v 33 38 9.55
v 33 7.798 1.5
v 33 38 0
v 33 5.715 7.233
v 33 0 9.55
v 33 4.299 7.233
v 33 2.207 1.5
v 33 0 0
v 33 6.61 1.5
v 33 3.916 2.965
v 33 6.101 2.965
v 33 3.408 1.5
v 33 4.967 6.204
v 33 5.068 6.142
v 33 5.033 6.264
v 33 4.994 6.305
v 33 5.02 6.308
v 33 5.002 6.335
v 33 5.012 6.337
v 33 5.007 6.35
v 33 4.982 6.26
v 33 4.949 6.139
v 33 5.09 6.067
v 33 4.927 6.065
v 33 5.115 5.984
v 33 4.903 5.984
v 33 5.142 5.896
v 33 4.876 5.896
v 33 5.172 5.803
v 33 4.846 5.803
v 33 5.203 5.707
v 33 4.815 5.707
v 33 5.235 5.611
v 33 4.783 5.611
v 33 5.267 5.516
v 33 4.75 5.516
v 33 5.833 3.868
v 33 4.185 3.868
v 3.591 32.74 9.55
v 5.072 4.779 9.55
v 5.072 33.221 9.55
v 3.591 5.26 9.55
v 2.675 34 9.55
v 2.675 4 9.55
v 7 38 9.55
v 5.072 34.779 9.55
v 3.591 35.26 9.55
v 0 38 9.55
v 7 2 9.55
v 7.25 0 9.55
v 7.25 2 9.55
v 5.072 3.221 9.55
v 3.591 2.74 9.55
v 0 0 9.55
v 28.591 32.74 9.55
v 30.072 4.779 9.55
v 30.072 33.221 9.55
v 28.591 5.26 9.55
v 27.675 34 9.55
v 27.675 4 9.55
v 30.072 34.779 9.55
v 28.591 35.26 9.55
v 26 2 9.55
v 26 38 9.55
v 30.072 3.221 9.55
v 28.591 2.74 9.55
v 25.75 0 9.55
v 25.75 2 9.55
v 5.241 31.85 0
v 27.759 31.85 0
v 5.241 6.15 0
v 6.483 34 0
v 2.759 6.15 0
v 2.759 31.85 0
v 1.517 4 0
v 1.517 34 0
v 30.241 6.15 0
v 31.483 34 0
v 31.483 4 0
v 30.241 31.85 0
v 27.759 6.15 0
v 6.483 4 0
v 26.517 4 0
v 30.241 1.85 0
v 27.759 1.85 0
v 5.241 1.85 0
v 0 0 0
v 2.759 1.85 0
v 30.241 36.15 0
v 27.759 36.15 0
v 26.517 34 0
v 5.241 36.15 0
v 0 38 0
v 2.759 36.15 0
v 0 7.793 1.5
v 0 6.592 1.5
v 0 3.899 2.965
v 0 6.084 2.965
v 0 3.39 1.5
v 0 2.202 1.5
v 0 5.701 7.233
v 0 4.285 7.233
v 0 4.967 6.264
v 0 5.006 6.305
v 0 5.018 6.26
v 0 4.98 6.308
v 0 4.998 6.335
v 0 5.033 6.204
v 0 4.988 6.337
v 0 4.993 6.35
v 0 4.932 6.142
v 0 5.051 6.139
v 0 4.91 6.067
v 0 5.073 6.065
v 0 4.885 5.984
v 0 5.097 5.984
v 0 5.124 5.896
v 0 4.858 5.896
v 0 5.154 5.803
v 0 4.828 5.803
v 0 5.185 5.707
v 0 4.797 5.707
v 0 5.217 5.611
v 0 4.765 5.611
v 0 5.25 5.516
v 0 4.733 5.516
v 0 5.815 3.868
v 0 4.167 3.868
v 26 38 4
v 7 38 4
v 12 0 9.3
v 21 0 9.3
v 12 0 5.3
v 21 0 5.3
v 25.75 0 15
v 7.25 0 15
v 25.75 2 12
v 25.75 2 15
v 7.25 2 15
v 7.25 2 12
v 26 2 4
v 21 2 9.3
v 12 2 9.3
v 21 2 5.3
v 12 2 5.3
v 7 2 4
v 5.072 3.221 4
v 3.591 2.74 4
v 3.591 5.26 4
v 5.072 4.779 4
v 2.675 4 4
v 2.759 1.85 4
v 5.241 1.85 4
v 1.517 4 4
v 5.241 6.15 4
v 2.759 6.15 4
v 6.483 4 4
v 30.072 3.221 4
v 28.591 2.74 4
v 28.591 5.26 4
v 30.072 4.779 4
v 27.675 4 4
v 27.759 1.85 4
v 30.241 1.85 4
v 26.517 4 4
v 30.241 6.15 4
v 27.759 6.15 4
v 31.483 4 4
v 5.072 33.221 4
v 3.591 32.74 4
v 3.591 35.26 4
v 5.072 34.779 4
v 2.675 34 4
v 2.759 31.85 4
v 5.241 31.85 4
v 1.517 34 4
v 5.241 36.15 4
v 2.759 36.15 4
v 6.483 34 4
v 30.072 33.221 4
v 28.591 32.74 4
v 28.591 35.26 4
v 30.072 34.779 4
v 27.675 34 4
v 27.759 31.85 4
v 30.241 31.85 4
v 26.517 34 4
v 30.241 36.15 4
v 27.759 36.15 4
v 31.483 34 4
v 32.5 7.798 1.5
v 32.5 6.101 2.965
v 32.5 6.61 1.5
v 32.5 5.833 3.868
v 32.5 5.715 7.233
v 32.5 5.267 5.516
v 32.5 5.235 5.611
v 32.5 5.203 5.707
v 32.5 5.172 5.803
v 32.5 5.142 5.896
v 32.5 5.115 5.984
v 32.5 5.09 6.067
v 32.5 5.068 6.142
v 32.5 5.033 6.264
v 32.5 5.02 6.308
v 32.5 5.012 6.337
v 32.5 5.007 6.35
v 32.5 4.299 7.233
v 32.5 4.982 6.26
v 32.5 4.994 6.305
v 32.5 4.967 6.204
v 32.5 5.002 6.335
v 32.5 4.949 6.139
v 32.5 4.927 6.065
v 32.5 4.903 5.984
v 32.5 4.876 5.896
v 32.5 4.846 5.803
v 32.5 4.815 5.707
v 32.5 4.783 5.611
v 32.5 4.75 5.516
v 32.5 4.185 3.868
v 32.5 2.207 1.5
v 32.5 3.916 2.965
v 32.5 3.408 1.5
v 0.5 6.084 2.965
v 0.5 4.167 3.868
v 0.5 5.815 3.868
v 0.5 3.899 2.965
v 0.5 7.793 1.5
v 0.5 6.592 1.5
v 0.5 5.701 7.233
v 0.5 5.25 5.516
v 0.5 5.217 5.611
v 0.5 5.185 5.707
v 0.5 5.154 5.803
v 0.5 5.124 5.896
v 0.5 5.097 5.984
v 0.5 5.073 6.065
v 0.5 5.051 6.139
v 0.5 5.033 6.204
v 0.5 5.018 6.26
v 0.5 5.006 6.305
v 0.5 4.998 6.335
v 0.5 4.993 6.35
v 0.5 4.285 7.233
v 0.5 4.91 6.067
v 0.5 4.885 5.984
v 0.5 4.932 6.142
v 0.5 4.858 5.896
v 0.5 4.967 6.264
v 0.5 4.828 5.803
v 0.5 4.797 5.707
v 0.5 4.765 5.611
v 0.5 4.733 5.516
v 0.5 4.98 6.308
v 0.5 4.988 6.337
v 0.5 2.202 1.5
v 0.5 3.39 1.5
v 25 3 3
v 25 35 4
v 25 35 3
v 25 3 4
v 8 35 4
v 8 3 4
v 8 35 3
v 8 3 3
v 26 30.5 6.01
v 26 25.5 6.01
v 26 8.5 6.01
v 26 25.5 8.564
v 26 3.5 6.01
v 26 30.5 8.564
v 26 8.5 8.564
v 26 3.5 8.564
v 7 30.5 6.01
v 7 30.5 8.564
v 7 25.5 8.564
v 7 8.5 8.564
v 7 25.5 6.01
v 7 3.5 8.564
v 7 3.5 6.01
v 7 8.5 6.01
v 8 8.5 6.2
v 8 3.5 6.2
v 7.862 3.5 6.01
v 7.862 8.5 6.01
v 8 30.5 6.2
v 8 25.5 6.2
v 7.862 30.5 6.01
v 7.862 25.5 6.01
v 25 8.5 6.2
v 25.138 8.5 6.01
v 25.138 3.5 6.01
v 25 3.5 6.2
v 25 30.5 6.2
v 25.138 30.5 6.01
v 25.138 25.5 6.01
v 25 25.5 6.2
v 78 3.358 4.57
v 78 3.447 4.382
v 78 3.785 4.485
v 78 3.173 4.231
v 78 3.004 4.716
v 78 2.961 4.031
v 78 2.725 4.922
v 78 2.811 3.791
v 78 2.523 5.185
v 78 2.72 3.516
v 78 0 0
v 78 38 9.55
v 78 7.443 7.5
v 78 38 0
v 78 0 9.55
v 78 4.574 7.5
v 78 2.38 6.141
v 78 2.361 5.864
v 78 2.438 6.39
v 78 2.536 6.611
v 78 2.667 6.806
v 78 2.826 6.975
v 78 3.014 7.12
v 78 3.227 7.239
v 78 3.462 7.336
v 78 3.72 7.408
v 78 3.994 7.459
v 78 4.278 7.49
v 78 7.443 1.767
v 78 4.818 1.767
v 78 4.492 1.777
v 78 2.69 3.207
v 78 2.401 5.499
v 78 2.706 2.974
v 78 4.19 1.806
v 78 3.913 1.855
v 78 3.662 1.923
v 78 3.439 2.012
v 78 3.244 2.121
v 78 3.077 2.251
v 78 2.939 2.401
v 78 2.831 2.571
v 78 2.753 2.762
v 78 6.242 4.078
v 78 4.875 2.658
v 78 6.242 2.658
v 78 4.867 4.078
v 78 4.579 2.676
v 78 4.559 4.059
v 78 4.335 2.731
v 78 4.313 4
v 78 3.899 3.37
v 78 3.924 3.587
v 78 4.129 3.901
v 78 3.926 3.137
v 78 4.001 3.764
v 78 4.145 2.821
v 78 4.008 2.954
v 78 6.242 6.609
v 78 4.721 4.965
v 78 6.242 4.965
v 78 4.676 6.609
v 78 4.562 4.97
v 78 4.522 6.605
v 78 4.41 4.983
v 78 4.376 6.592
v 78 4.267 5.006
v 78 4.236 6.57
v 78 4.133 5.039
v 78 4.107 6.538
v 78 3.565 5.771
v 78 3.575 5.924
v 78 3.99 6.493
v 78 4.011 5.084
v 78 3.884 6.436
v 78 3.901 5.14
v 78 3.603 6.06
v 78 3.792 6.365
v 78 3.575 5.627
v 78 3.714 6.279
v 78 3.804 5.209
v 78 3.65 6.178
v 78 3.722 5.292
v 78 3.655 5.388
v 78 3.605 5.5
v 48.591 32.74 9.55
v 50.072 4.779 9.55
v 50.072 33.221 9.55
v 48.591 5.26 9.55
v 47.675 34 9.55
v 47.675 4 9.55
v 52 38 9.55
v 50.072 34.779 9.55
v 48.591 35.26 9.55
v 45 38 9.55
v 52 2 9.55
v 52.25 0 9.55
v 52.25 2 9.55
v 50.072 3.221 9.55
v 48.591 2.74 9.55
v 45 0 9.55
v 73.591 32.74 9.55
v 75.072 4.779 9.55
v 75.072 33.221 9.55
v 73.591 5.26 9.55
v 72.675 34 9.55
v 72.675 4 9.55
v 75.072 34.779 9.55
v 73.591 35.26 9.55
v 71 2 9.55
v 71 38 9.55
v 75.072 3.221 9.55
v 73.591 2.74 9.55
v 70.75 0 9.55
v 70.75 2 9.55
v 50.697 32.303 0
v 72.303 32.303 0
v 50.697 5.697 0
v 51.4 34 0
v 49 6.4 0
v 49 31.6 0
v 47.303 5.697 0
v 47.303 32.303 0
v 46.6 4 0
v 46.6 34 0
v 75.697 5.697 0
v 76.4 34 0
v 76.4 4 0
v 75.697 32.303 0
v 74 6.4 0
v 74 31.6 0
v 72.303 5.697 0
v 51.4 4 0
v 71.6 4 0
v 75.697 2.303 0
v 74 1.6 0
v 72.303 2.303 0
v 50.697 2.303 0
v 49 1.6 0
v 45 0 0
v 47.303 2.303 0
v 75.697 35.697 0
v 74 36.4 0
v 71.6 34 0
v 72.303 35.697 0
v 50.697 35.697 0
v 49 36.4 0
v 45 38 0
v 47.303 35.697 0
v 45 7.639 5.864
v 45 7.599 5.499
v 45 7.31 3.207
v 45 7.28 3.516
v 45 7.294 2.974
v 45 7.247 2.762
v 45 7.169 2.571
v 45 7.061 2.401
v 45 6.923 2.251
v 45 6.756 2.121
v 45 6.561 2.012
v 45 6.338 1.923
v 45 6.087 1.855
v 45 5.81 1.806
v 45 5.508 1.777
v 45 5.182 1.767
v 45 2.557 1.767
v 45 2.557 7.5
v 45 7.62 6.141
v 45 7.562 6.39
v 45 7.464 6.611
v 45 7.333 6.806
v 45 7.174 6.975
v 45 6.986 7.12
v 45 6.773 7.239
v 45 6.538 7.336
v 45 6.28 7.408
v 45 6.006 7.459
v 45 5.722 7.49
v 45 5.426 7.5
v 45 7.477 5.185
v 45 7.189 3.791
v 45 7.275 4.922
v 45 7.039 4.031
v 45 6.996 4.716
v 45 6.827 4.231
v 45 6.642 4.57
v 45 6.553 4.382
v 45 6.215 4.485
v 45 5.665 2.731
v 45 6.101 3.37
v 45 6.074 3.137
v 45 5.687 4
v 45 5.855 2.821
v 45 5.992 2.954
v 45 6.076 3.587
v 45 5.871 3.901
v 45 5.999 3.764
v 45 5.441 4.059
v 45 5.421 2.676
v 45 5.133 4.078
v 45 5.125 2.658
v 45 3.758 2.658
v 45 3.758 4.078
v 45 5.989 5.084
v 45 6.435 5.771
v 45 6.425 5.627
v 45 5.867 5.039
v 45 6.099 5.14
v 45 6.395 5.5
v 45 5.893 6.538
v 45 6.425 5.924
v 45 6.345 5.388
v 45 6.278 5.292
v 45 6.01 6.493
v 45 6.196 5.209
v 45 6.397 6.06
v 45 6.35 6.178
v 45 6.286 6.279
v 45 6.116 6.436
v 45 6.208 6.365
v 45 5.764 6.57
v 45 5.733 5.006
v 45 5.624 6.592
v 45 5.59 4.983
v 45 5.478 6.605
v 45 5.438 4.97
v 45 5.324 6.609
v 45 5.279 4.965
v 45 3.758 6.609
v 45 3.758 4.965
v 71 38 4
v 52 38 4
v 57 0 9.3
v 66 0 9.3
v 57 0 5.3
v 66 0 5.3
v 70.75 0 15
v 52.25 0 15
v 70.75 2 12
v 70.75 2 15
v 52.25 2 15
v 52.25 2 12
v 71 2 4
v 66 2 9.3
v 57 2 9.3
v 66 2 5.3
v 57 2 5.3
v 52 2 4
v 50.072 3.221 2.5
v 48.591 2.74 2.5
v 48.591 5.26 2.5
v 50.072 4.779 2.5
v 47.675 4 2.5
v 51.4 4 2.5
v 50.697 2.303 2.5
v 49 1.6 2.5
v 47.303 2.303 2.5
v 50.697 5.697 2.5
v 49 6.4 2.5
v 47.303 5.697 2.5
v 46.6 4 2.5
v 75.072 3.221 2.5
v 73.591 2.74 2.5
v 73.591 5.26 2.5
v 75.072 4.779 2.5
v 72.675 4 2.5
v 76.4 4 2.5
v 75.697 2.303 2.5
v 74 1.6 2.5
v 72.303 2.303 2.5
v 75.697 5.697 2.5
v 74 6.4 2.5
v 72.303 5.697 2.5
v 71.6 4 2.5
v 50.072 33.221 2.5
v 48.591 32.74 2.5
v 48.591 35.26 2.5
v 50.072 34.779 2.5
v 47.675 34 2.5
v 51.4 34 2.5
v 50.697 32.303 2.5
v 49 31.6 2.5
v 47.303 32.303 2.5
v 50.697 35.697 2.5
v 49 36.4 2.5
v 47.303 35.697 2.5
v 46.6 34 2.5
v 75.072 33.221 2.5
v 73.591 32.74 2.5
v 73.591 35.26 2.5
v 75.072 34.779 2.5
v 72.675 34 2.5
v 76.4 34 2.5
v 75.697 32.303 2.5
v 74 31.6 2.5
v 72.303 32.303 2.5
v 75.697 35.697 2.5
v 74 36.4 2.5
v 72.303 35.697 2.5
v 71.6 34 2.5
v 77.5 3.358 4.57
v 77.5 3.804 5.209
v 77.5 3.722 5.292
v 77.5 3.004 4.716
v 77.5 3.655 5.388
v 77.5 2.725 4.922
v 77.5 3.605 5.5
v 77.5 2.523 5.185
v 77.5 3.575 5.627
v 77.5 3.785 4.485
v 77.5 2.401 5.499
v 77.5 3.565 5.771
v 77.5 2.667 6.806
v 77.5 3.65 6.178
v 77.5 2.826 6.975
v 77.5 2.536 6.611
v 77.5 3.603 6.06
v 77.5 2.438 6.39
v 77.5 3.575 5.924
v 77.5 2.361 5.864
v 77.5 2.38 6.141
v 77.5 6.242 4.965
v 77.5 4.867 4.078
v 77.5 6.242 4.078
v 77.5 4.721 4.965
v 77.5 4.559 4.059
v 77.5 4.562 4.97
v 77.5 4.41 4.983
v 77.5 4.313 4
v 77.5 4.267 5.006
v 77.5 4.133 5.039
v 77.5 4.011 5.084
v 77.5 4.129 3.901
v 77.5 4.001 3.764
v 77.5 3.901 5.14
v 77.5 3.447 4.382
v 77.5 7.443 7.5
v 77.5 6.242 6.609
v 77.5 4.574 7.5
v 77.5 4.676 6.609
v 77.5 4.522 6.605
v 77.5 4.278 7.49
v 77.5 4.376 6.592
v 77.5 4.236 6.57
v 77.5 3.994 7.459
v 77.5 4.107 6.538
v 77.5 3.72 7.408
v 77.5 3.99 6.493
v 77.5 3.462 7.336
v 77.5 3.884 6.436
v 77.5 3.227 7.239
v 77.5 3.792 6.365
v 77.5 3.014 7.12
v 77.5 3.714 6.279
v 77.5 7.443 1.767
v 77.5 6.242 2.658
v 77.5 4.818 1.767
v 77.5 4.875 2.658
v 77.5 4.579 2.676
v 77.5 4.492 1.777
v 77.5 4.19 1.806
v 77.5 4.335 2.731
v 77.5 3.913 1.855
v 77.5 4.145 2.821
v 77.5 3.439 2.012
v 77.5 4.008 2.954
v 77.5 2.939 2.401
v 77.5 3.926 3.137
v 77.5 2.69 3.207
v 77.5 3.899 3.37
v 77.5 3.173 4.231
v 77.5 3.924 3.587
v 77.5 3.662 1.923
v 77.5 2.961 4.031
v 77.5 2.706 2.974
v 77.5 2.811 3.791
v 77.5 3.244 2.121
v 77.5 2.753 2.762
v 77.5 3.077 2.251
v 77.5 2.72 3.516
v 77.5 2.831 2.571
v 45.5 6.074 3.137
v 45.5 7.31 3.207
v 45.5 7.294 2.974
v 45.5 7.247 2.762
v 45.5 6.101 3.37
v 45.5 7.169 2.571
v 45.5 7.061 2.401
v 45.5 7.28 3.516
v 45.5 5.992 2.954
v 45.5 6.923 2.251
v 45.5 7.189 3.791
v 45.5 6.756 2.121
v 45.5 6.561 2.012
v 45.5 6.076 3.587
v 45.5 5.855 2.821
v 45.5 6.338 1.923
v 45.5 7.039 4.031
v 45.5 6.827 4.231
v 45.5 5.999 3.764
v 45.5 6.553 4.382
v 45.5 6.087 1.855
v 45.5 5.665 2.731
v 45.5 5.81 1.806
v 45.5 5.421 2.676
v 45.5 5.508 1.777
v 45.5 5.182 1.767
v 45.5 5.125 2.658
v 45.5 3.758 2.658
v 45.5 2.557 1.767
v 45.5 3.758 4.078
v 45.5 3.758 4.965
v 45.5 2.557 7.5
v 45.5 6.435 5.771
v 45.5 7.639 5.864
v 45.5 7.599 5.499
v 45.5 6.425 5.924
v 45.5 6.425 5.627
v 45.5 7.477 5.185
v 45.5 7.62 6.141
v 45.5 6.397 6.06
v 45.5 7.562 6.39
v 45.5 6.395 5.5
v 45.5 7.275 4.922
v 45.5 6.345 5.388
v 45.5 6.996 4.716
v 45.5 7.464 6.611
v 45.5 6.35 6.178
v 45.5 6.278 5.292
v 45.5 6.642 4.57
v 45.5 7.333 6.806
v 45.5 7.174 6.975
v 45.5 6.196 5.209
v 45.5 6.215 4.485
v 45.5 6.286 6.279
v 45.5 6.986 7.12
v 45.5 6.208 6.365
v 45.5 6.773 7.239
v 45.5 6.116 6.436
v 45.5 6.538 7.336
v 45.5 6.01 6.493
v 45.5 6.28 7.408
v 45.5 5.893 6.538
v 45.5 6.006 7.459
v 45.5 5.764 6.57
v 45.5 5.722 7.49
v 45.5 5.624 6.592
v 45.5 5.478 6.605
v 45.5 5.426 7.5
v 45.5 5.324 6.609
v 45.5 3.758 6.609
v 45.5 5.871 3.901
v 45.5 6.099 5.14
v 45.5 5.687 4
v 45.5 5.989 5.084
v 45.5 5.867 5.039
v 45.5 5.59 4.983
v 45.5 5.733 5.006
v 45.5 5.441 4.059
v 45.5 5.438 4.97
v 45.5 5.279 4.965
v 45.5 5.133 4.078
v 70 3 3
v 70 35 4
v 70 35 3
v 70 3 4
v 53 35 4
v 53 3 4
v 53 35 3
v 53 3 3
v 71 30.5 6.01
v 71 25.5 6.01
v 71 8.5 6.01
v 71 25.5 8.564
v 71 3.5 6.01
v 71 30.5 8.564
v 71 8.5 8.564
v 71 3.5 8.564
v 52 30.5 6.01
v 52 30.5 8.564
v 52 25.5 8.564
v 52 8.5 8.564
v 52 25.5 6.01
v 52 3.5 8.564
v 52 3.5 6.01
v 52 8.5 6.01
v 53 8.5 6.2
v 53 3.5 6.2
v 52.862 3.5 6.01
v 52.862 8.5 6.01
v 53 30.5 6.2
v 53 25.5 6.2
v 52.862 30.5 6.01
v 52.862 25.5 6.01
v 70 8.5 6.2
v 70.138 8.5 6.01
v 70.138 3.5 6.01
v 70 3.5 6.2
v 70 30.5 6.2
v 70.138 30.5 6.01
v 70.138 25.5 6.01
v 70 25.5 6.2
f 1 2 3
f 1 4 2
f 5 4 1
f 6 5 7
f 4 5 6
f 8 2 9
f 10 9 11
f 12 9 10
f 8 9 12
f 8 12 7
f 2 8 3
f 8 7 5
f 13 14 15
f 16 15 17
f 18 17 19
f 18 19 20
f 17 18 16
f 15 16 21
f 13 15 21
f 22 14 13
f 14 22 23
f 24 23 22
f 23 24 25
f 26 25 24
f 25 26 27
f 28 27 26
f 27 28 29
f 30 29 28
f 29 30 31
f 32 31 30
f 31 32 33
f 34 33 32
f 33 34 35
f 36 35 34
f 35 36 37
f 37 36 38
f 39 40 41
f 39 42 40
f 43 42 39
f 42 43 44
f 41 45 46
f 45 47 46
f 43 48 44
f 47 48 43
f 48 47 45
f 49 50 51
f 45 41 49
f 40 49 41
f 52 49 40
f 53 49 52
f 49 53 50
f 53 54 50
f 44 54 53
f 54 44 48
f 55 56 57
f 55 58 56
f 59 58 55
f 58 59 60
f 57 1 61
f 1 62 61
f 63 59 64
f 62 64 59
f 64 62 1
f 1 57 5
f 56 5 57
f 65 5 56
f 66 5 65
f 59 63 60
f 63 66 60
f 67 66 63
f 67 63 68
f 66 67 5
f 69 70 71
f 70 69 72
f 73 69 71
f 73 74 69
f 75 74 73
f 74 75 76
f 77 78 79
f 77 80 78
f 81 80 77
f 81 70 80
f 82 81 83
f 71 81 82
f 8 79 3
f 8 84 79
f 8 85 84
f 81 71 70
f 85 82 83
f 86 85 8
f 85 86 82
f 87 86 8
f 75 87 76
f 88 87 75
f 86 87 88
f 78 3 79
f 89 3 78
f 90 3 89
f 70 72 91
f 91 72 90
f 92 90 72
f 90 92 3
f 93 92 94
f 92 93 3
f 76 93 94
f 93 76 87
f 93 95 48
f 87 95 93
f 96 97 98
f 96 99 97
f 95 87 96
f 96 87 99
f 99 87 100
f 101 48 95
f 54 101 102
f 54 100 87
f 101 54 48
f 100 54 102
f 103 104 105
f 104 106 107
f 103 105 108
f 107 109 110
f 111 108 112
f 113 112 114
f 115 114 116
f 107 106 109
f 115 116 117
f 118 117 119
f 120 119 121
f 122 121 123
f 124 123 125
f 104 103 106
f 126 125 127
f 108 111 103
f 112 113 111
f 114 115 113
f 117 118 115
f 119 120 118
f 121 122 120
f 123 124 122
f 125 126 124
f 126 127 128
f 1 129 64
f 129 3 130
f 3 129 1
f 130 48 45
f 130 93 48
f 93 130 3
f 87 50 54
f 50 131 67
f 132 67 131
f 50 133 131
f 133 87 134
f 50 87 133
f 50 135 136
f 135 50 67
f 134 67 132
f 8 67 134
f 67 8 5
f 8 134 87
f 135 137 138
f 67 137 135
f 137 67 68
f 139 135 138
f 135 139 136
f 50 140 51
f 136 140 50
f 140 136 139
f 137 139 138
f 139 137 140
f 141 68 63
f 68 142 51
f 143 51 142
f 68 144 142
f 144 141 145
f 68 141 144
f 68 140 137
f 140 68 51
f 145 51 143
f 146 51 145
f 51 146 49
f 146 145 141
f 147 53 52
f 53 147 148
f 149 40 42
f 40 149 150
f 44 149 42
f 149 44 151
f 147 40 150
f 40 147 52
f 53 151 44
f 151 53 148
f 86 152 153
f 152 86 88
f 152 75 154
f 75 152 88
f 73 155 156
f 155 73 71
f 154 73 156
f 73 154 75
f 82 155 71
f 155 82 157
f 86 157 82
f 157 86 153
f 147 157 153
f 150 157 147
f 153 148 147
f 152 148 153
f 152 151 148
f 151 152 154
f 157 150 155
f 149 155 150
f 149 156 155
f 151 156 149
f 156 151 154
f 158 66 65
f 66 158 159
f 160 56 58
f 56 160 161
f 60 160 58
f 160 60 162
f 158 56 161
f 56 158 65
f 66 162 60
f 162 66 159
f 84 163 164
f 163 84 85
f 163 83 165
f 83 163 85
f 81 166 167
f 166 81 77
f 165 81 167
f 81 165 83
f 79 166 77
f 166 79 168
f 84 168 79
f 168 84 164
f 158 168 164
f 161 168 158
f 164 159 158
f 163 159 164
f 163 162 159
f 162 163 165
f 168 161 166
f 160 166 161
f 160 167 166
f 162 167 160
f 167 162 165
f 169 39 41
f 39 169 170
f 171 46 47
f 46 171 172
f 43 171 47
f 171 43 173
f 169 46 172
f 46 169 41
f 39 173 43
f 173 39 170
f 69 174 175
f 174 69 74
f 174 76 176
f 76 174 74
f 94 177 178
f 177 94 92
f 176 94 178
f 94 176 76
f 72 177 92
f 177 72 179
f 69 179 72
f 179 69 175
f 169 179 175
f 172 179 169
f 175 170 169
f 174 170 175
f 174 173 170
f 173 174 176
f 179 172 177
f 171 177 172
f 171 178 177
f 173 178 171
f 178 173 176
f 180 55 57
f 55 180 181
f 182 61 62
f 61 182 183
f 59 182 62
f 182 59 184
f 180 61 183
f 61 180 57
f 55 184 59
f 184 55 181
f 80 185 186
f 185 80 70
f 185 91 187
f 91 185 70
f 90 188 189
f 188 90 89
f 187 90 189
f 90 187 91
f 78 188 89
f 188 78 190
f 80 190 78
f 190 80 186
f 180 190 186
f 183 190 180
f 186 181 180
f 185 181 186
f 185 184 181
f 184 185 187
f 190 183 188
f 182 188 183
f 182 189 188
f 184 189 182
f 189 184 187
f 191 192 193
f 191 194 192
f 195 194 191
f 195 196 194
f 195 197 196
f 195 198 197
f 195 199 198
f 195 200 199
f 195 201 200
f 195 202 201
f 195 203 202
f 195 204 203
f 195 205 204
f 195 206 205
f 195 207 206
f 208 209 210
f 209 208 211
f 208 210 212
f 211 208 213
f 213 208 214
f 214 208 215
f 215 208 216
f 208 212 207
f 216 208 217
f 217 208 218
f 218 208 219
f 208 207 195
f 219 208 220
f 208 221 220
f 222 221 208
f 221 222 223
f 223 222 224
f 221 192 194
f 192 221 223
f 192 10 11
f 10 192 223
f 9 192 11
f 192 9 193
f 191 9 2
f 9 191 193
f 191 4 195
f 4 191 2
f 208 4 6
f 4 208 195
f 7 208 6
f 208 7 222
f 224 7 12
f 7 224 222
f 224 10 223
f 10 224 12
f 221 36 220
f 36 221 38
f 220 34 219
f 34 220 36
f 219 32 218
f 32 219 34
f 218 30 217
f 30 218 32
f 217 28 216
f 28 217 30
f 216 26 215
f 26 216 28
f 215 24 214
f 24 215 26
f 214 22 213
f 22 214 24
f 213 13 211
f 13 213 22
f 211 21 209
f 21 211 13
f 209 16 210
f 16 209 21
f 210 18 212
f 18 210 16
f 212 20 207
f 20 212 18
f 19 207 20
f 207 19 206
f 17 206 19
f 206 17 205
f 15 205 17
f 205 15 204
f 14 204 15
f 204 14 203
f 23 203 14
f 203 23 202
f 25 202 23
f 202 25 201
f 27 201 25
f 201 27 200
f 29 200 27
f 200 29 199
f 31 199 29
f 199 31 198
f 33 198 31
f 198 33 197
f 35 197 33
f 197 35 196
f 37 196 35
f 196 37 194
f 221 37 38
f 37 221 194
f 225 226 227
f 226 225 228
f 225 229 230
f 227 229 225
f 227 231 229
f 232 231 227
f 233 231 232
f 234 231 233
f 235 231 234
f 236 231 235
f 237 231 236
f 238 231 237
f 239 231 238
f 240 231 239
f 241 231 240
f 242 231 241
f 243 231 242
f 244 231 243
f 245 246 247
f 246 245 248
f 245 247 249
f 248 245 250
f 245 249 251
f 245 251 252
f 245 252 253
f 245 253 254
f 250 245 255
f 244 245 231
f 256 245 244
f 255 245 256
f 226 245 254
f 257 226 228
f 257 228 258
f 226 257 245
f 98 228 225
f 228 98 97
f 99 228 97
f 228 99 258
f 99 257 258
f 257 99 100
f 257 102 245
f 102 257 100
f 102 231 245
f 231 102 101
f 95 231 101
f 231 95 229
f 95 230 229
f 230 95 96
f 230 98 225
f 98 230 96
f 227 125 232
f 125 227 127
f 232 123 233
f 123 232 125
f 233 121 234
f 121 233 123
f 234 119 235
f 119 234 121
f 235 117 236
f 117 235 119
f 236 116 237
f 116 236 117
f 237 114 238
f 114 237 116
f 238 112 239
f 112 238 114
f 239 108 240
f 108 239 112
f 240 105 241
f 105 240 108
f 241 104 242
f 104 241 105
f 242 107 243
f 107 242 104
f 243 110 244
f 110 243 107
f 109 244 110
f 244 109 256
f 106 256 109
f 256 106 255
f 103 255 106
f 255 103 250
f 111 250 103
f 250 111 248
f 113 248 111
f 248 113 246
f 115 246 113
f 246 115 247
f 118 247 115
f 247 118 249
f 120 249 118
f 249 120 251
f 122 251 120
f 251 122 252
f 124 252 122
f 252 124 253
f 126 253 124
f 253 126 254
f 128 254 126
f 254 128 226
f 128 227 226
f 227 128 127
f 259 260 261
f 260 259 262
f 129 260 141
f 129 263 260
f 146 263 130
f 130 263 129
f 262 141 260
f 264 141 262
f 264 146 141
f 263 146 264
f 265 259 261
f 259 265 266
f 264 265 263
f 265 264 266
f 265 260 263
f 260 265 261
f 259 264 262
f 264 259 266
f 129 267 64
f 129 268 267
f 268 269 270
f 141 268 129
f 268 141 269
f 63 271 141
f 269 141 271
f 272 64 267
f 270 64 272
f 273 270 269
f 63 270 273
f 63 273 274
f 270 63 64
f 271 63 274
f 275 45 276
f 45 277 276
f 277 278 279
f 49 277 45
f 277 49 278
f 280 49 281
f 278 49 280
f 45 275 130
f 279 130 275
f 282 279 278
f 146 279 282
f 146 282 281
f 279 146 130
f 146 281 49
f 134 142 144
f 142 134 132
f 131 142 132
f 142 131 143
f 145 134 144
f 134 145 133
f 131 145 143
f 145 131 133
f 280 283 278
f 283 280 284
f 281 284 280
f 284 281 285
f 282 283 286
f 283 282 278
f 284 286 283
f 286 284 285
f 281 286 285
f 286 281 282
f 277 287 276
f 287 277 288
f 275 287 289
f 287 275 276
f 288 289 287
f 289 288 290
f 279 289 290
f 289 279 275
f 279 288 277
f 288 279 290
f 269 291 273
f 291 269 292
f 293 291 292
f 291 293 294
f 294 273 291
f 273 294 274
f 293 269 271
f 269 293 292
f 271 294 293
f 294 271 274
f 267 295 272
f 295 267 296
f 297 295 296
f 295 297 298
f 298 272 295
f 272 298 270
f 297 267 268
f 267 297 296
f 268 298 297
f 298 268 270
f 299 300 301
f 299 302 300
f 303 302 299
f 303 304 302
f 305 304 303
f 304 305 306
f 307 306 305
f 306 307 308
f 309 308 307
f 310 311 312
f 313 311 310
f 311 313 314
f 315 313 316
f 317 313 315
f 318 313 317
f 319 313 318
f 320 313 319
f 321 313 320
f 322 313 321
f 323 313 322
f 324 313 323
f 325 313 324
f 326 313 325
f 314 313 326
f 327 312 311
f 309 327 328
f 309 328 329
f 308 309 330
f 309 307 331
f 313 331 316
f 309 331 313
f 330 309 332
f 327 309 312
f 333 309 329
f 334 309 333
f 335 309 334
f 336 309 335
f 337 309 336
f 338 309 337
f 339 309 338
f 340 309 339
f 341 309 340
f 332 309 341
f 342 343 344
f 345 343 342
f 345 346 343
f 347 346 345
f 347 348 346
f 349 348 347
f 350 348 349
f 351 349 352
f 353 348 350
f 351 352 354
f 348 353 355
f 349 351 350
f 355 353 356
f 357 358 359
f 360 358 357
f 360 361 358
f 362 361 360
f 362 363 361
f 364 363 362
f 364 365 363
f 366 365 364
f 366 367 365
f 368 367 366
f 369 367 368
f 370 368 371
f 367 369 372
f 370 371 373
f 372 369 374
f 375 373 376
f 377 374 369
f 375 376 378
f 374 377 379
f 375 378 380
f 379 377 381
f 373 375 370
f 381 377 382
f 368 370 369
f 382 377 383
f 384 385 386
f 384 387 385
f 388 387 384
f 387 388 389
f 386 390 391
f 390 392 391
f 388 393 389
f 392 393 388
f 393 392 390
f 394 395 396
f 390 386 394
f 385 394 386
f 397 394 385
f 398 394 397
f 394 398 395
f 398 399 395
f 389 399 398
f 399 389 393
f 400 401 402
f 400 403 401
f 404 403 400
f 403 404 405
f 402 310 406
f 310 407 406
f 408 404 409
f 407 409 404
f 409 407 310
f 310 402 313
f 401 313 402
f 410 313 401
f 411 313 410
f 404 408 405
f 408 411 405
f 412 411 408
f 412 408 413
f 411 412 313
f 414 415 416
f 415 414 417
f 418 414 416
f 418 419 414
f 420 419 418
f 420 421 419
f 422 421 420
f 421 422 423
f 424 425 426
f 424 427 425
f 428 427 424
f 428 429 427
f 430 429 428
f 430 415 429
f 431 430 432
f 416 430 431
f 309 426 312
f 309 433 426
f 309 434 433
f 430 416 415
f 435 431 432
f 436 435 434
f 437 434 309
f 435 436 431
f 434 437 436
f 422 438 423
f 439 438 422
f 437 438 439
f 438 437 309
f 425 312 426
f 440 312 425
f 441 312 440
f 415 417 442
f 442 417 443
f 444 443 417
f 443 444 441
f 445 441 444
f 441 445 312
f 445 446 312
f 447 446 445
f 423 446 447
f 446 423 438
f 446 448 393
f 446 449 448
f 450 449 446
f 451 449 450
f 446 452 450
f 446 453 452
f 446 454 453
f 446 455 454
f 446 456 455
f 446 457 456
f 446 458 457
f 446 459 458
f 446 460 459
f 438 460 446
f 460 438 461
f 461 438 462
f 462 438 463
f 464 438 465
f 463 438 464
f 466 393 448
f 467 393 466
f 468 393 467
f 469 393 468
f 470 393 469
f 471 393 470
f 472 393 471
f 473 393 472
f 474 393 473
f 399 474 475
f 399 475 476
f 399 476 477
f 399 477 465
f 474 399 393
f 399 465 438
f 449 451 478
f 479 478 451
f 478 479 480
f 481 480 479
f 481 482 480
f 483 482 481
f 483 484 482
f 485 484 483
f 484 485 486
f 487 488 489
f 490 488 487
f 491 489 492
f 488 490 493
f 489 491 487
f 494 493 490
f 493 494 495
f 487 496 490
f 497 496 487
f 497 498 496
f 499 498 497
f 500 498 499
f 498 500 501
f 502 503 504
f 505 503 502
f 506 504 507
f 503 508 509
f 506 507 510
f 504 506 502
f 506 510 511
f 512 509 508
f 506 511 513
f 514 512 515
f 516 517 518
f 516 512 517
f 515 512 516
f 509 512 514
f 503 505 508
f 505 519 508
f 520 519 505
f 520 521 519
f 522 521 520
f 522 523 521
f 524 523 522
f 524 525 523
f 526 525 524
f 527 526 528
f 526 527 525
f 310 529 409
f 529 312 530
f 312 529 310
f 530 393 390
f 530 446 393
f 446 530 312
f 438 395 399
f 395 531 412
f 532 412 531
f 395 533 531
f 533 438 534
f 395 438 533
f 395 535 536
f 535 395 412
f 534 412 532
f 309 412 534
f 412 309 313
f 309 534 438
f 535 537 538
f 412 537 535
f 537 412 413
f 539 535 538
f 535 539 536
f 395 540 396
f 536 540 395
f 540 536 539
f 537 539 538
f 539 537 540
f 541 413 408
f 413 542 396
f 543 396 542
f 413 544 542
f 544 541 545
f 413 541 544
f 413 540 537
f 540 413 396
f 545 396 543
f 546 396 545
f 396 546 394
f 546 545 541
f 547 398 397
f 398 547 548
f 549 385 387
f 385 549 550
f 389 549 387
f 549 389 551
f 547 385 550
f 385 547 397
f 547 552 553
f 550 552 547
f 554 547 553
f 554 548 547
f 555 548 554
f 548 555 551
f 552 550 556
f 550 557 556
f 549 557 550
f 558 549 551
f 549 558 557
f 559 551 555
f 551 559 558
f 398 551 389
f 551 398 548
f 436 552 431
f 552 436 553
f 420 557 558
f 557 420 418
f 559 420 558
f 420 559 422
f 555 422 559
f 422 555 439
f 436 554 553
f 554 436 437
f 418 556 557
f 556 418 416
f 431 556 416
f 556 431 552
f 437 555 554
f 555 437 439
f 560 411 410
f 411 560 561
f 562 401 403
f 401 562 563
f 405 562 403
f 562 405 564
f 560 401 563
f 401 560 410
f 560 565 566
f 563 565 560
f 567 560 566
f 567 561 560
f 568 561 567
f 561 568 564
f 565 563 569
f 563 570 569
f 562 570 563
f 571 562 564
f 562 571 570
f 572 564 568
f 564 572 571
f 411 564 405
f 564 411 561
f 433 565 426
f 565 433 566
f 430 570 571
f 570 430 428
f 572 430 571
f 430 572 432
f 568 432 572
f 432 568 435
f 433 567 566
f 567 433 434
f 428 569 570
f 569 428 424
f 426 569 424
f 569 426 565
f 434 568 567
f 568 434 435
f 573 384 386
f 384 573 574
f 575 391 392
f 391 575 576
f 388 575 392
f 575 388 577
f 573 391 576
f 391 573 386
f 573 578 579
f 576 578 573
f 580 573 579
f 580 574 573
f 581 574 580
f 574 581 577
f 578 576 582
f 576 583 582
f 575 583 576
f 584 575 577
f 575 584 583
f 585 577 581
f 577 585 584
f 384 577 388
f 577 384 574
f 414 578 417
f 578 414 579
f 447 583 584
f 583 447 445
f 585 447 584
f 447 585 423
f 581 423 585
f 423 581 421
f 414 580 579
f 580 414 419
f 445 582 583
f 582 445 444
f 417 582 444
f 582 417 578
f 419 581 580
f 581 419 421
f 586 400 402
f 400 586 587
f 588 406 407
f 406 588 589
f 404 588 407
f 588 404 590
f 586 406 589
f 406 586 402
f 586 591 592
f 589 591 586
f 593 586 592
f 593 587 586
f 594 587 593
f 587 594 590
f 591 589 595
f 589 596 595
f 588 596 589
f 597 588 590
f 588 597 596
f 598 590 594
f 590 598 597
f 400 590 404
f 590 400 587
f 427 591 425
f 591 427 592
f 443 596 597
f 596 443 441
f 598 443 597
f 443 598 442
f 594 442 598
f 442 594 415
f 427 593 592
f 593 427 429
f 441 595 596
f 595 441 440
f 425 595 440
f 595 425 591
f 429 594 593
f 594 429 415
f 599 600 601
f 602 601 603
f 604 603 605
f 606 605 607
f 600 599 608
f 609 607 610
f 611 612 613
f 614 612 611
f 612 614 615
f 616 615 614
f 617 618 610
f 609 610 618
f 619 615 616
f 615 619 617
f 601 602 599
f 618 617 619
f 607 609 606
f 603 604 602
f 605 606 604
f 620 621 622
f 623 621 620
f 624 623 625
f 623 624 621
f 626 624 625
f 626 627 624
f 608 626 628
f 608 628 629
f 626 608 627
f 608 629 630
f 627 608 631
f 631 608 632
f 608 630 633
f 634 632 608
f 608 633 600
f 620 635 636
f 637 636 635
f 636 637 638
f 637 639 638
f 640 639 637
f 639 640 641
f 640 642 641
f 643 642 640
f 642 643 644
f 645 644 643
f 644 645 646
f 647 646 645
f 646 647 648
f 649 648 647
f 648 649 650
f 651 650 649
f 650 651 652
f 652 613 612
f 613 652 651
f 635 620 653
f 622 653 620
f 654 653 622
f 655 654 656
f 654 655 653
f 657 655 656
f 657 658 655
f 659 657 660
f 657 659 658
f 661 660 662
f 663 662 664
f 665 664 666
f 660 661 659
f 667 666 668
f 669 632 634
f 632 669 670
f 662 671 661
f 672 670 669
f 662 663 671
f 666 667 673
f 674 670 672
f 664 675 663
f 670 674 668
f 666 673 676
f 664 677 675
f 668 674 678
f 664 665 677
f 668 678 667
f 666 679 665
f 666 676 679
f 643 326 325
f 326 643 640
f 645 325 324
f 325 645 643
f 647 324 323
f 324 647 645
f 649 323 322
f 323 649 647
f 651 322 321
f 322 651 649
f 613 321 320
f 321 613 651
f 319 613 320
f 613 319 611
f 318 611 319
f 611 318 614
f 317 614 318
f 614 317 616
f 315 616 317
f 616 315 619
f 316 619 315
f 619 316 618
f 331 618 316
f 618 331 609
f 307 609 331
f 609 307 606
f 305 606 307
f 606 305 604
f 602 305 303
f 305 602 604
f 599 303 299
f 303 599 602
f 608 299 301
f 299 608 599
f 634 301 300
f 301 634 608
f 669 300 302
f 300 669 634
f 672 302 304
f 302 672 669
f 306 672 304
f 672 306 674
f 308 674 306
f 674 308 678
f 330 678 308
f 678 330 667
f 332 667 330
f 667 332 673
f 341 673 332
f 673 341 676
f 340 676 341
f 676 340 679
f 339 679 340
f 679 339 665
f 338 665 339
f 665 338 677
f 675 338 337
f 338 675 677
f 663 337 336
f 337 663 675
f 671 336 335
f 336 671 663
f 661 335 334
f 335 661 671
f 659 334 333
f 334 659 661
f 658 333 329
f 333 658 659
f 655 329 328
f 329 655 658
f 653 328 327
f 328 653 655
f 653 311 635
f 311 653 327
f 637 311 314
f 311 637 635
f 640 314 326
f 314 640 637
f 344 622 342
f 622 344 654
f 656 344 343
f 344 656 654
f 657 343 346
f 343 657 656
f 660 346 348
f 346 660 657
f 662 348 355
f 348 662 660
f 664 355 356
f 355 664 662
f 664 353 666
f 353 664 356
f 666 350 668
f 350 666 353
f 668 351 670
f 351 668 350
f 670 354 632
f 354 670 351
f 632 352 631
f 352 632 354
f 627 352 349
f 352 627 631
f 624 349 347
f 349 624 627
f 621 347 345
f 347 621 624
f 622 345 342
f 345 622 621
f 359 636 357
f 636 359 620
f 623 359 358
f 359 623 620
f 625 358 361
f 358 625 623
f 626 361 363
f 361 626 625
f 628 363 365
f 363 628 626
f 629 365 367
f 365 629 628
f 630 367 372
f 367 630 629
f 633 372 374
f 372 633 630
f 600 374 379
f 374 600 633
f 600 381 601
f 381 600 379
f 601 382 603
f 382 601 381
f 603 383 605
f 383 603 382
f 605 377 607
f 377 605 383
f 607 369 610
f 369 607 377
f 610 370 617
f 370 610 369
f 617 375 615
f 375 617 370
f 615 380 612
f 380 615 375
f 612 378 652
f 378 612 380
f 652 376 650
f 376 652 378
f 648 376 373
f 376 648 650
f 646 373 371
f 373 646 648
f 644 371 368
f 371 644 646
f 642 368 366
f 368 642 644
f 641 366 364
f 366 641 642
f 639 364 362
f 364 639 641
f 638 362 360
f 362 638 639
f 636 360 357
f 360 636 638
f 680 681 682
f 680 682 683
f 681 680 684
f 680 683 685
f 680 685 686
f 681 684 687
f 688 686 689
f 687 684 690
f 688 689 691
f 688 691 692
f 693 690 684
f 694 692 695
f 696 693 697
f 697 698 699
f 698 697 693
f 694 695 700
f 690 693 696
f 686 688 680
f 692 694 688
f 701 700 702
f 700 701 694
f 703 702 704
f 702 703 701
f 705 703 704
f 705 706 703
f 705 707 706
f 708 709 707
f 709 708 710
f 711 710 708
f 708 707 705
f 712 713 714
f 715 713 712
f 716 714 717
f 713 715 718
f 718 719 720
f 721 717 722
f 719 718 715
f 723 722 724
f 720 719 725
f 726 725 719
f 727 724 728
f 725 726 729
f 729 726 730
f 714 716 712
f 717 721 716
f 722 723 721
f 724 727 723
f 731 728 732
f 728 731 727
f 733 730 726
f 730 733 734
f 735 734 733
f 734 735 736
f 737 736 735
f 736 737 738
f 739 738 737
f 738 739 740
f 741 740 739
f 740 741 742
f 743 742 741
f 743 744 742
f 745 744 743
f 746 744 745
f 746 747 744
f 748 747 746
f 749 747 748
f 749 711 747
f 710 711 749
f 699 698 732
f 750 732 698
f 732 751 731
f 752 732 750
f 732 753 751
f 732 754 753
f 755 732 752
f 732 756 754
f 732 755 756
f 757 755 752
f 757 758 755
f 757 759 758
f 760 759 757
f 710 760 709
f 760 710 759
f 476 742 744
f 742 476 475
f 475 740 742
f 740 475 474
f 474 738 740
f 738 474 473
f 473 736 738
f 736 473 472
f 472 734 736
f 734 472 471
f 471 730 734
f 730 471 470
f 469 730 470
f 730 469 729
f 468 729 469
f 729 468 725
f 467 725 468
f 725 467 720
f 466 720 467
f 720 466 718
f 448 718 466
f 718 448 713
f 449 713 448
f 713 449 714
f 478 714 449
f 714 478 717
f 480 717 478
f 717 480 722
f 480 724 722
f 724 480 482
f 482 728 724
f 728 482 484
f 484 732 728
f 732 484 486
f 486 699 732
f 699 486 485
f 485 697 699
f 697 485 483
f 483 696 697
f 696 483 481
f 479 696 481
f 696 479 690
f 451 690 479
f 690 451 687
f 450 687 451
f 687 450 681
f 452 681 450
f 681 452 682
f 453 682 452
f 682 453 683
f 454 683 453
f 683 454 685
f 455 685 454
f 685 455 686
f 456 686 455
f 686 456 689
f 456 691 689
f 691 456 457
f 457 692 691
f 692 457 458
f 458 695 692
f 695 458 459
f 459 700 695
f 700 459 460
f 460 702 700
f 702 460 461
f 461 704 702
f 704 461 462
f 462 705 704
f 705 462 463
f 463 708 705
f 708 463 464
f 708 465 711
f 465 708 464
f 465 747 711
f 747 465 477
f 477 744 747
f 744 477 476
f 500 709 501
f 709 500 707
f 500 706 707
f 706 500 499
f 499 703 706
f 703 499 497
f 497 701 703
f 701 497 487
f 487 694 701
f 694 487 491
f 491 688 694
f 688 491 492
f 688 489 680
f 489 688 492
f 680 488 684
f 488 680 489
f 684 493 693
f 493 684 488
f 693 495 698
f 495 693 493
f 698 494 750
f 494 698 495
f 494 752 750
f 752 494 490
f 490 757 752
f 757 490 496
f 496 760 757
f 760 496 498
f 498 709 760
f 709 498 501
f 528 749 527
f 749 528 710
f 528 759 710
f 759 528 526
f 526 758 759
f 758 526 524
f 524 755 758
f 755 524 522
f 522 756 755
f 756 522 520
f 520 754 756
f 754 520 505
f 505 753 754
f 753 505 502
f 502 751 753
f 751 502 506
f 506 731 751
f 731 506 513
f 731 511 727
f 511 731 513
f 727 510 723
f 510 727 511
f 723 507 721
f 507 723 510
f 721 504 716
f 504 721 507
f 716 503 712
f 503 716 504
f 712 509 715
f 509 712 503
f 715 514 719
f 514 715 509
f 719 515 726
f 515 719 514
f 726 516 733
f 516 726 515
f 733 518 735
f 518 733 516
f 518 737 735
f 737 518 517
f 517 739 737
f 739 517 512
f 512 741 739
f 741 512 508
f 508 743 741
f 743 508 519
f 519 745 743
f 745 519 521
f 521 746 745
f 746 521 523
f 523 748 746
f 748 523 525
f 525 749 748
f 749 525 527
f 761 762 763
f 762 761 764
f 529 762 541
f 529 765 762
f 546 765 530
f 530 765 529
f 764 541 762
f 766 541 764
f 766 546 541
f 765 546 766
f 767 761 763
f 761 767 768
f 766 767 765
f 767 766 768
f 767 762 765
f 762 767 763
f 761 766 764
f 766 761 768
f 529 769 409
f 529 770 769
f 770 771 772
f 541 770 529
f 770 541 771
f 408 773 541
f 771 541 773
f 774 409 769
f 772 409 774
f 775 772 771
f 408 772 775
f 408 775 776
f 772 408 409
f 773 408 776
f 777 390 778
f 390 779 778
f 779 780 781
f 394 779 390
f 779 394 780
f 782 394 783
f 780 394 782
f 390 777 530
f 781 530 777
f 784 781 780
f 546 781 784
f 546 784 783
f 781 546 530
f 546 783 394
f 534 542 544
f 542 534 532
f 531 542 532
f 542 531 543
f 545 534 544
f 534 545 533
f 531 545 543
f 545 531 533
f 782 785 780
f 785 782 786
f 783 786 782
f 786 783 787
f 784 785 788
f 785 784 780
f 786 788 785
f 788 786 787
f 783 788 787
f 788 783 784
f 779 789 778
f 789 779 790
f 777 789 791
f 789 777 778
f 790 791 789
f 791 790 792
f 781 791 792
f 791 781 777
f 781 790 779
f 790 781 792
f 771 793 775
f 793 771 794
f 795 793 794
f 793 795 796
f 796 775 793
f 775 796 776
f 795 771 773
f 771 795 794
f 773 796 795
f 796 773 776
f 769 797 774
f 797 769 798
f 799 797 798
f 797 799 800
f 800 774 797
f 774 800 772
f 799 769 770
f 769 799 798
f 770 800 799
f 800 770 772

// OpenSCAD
// file: data-access.scad
// Norm Nuts and Bolts - a OpenSCAD library
// Copyright (C) 2012  Johannes Kneer

// This program is free software: you can redistribute it and/or modify
// it under the terms of the GNU General Public License as published by
// the Free Software Foundation, either version 3 of the License, or
// (at your option) any later version.

// This program is distributed in the hope that it will be useful,
// but WITHOUT ANY WARRANTY; without even the implied warranty of
// MERCHANTABILITY or FITNESS FOR A PARTICULAR PURPOSE.  See the
// GNU General Public License for more details.

// You should have received a copy of the GNU General Public License
// along with this program.  If not, see <http://www.gnu.org/licenses/>.


// DATABASE ACCESS FUNCTIONS AND CONSTANTS



// == CONSTANTS ==

// screw table access keys
_NB_S_DESC            = 0;
_NB_S_FAMKEY			    = 1;
_NB_S_LENGTH          = 2;
_NB_S_NOTHREAD_LENGTH = 3;

_NB_F_DESC			      = 0;
_NB_F_OUTER_DIA       = 1;
_NB_F_INNER_DIA       = 2;
_NB_F_LEAD            = 3;
_NB_F_KEY             = 4;
_NB_F_KEY_DEPTH       = 5;
_NB_F_HEAD_HEIGHT     = 6;
_NB_F_HEAD_DIA        = 7;
_NB_F_NUT_KEY         = 8;
_NB_F_NUT_HEIGHT      = 9;
_NB_F_PITCH_FINE      = 10;
_NB_F_PITCH_MEDIUM    = 11;
_NB_F_PITCH_COARSE    = 12;


// == FUNCTIONS ==

// _get_screw("descriptor")   with descriptor = M8x25
//   find the line for a general object in the data matrix

function _get_screw(n) = data_screw[search([n], data_screw)[0]];
function _get_screw_fam(n) = data_screw_fam[search([_get_screw(n)[_NB_S_FAMKEY]], data_screw_fam)[0]];

function _get_fam(n) = data_screw_fam[search([n], data_screw_fam)[0]];


// _get_XXXXX("descriptor") functions
// find a single property in the database

function _get_desc(n)        = _get_screw(n)[_NB_S_DESC];
function _get_famkey(n)         = _get_screw(n)[_NB_S_FAMKEY];
function _get_length(n)      = _get_screw(n)[_NB_S_LENGTH];
function _get_nt_length(n)   = _get_screw(n)[_NB_S_NOTHREAD_LENGTH];

function _get_outer_dia(n)   = _get_screw_fam(n)[_NB_F_OUTER_DIA];
function _get_inner_dia(n)   = _get_screw_fam(n)[_NB_F_INNER_DIA];
function _get_lead(n)        = _get_screw_fam(n)[_NB_F_LEAD];
function _get_head_height(n) = _get_screw_fam(n)[_NB_F_HEAD_HEIGHT];
function _get_head_dia(n)    = _get_screw_fam(n)[_NB_F_HEAD_DIA];
function _get_nut_key(n)     = _get_screw_fam(n)[_NB_F_NUT_KEY];
function _get_nut_height(n)  = _get_screw_fam(n)[_NB_F_NUT_HEIGHT];
function _get_fine_pitch(n)  = _get_screw_fam(n)[_NB_F_PITCH_FINE];
function _get_medium_pitch(n)  = _get_screw_fam(n)[_NB_F_PITCH_MEDIUM];
function _get_coarse_pitch(n)  = _get_screw_fam(n)[_NB_F_PITCH_COARSE];
// main file
include <MCAD/units.scad>;
include <cyl_head_bolt.scad>;

width = 22+11;
height = 38;
screw_spacing = 4;
inner_width = 19;
inner_height = 34;


module a() {
    difference() {
        union() {
            cube([width,height,9.55]);
            translate([((width-inner_width)/2)+0.25,0,9]) cube([inner_width-0.5,2,6]);
            translate([3,3,0]) cylinder(r=2, h=9, $fn=30);
            translate([width - 3,3,0]) cylinder(r=2, h=9, $fn=30);
            translate([3,height-3,0]) cylinder(r=2, h=9, $fn=30);
            translate([width - 3,height-3,0]) cylinder(r=2, h=9, $fn=30);
        }
        translate([width-0.5,2,1.5]) rotate([90,0,90]) linear_extrude(2)
            text("A", size = 6, font = "Helvetica:style=Bold");
        translate([0.5,8,1.5]) {
            rotate([90,0,270]) linear_extrude(2)
            text("A", size = 6, font = "Helvetica:style=Bold");
        }

        translate([(width-inner_width+2)/2,3,3]) cube([inner_width-2,inner_height-2,1]);
        translate([(width-inner_width)/2,2,4]) cube([inner_width,inner_height+4,8]);
        //Screw holes
        translate([screw_spacing,screw_spacing,0]) rotate([0,180,0]) {
           nutcatch_parallel("M2", l=4, clk=0.3, clh=1.5, clsl=0.3); 
           translate([0,0,4]) hole_through(name="M2", l=20, cld=0.65, h=2.5, hcl=0.4);
        }
        translate([width - screw_spacing,screw_spacing,0]) rotate([0,180,0]) {
           nutcatch_parallel("M2", l=4, clk=0.3, clh=1.5, clsl=0.3);
           translate([0,0,4]) hole_through(name="M2", l=20, cld=0.65, h=2.5, hcl=0.4);
        }
        translate([screw_spacing,height-screw_spacing,0]) rotate([0,180,0]) {
           nutcatch_parallel("M2", l=4, clk=0.3, clh=1.5, clsl=0.3);
           translate([0,0,4]) hole_through(name="M2", l=20, cld=0.65, h=2.5, hcl=0.4);
        }
        translate([width - screw_spacing,height-screw_spacing,0]) rotate([0,180,0]) {
           nutcatch_parallel("M2", l=4, clk=0.3, clh=1.5, clsl=0.3);
           translate([0,0,4]) hole_through(name="M2", l=20, cld=0.65, h=2.5, hcl=0.4);
        }
        
        //Connector hole
        translate([((width-inner_width)/2)+(inner_width - 9)/2,0,5.3]) cube([9,3,4]);
    }
    rotate([90,0,0]) translate([((width-inner_width)/2)-0.5,6,-8.5]) right_triangle(1.5,3,0.2,5);
    rotate([90,0,0]) translate([((width-inner_width)/2)-0.5,6,-30.5]) right_triangle(1.5,3,0.2,5);

    rotate([90,0,180]) translate([-(width-((width-inner_width)/2)+0.5),6,3.5]) right_triangle(1.5,3,0.2,5);
    rotate([90,0,180]) translate([-(width-((width-inner_width)/2)+0.5),6,25.5]) right_triangle(1.5,3,0.2,5);
}

module b() {
    difference() {
        union() {
            cube([width,height,9.55]);
            translate([((width-inner_width)/2)+0.25,0,9]) cube([inner_width-0.5,2,6]);
            translate([3,3,0]) cylinder(r=2, h=9, $fn=30);
            translate([width - 3,3,0]) cylinder(r=2, h=9, $fn=30);
            translate([3,height-3,0]) cylinder(r=2, h=9, $fn=30);
            translate([width - 3,height-3,0]) cylinder(r=2, h=9, $fn=30);
        }
        translate([width-0.5,8,7.5]) rotate([90,180,90]) linear_extrude(2)
        text("B", size = 6, font = "Helvetica:style=Bold");
        translate([0.5,2,7.5]) {
            rotate([90,180,270]) linear_extrude(2)
            text("B", size = 6, font = "Helvetica:style=Bold");
        }
        translate([(width-inner_width+2)/2,3,3]) cube([inner_width-2,inner_height-2,1]);
        translate([(width-inner_width)/2,2,4]) cube([inner_width,inner_height+4,8]);
        //Screw holes
        translate([screw_spacing,screw_spacing,0]) rotate([0,180,0]) {
           hole_through(name="M2", l=10, cld=0.65, h=2.5, hcl=0.4);
        }
        translate([width - screw_spacing,screw_spacing,0]) rotate([0,180,0]) {
           hole_through(name="M2", l=10, cld=0.65, h=2.5, hcl=0.4);
        }
        translate([screw_spacing,height-screw_spacing,0]) rotate([0,180,0]) {
           hole_through(name="M2", l=10, cld=0.65, h=2.5, hcl=0.4);
        }
        translate([width - screw_spacing,height-screw_spacing,0]) rotate([0,180,0]) {
           hole_through(name="M2", l=10, cld=0.65, h=2.5, hcl=0.4);
        }

        //Connector hole
        translate([((width-inner_width)/2)+(inner_width - 9)/2,0,5.3]) cube([9,3,4]);
    }

    rotate([90,0,0]) translate([((width-inner_width)/2)-0.5,6,-8.5]) right_triangle(1.5,3,0.2,5);
    rotate([90,0,0]) translate([((width-inner_width)/2)-0.5,6,-30.5]) right_triangle(1.5,3,0.2,5);

    rotate([90,0,180]) translate([-(width-((width-inner_width)/2)+0.5),6,3.5]) right_triangle(1.5,3,0.2,5);
    rotate([90,0,180]) translate([-(width-((width-inner_width)/2)+0.5),6,25.5]) right_triangle(1.5,3,0.2,5);
}

module right_triangle(side1,side2,corner_radius,triangle_height){
    translate([corner_radius,corner_radius,0]){
        hull(){  
            cylinder(r=corner_radius,h=triangle_height);
            translate([side1-corner_radius*2,0,0])cylinder(r=corner_radius,h=triangle_height);
            translate([0,side2-corner_radius*2,0])cylinder(r=corner_radius,h=triangle_height);
        }
    }
}

a();
translate([45,0,0]) b();
